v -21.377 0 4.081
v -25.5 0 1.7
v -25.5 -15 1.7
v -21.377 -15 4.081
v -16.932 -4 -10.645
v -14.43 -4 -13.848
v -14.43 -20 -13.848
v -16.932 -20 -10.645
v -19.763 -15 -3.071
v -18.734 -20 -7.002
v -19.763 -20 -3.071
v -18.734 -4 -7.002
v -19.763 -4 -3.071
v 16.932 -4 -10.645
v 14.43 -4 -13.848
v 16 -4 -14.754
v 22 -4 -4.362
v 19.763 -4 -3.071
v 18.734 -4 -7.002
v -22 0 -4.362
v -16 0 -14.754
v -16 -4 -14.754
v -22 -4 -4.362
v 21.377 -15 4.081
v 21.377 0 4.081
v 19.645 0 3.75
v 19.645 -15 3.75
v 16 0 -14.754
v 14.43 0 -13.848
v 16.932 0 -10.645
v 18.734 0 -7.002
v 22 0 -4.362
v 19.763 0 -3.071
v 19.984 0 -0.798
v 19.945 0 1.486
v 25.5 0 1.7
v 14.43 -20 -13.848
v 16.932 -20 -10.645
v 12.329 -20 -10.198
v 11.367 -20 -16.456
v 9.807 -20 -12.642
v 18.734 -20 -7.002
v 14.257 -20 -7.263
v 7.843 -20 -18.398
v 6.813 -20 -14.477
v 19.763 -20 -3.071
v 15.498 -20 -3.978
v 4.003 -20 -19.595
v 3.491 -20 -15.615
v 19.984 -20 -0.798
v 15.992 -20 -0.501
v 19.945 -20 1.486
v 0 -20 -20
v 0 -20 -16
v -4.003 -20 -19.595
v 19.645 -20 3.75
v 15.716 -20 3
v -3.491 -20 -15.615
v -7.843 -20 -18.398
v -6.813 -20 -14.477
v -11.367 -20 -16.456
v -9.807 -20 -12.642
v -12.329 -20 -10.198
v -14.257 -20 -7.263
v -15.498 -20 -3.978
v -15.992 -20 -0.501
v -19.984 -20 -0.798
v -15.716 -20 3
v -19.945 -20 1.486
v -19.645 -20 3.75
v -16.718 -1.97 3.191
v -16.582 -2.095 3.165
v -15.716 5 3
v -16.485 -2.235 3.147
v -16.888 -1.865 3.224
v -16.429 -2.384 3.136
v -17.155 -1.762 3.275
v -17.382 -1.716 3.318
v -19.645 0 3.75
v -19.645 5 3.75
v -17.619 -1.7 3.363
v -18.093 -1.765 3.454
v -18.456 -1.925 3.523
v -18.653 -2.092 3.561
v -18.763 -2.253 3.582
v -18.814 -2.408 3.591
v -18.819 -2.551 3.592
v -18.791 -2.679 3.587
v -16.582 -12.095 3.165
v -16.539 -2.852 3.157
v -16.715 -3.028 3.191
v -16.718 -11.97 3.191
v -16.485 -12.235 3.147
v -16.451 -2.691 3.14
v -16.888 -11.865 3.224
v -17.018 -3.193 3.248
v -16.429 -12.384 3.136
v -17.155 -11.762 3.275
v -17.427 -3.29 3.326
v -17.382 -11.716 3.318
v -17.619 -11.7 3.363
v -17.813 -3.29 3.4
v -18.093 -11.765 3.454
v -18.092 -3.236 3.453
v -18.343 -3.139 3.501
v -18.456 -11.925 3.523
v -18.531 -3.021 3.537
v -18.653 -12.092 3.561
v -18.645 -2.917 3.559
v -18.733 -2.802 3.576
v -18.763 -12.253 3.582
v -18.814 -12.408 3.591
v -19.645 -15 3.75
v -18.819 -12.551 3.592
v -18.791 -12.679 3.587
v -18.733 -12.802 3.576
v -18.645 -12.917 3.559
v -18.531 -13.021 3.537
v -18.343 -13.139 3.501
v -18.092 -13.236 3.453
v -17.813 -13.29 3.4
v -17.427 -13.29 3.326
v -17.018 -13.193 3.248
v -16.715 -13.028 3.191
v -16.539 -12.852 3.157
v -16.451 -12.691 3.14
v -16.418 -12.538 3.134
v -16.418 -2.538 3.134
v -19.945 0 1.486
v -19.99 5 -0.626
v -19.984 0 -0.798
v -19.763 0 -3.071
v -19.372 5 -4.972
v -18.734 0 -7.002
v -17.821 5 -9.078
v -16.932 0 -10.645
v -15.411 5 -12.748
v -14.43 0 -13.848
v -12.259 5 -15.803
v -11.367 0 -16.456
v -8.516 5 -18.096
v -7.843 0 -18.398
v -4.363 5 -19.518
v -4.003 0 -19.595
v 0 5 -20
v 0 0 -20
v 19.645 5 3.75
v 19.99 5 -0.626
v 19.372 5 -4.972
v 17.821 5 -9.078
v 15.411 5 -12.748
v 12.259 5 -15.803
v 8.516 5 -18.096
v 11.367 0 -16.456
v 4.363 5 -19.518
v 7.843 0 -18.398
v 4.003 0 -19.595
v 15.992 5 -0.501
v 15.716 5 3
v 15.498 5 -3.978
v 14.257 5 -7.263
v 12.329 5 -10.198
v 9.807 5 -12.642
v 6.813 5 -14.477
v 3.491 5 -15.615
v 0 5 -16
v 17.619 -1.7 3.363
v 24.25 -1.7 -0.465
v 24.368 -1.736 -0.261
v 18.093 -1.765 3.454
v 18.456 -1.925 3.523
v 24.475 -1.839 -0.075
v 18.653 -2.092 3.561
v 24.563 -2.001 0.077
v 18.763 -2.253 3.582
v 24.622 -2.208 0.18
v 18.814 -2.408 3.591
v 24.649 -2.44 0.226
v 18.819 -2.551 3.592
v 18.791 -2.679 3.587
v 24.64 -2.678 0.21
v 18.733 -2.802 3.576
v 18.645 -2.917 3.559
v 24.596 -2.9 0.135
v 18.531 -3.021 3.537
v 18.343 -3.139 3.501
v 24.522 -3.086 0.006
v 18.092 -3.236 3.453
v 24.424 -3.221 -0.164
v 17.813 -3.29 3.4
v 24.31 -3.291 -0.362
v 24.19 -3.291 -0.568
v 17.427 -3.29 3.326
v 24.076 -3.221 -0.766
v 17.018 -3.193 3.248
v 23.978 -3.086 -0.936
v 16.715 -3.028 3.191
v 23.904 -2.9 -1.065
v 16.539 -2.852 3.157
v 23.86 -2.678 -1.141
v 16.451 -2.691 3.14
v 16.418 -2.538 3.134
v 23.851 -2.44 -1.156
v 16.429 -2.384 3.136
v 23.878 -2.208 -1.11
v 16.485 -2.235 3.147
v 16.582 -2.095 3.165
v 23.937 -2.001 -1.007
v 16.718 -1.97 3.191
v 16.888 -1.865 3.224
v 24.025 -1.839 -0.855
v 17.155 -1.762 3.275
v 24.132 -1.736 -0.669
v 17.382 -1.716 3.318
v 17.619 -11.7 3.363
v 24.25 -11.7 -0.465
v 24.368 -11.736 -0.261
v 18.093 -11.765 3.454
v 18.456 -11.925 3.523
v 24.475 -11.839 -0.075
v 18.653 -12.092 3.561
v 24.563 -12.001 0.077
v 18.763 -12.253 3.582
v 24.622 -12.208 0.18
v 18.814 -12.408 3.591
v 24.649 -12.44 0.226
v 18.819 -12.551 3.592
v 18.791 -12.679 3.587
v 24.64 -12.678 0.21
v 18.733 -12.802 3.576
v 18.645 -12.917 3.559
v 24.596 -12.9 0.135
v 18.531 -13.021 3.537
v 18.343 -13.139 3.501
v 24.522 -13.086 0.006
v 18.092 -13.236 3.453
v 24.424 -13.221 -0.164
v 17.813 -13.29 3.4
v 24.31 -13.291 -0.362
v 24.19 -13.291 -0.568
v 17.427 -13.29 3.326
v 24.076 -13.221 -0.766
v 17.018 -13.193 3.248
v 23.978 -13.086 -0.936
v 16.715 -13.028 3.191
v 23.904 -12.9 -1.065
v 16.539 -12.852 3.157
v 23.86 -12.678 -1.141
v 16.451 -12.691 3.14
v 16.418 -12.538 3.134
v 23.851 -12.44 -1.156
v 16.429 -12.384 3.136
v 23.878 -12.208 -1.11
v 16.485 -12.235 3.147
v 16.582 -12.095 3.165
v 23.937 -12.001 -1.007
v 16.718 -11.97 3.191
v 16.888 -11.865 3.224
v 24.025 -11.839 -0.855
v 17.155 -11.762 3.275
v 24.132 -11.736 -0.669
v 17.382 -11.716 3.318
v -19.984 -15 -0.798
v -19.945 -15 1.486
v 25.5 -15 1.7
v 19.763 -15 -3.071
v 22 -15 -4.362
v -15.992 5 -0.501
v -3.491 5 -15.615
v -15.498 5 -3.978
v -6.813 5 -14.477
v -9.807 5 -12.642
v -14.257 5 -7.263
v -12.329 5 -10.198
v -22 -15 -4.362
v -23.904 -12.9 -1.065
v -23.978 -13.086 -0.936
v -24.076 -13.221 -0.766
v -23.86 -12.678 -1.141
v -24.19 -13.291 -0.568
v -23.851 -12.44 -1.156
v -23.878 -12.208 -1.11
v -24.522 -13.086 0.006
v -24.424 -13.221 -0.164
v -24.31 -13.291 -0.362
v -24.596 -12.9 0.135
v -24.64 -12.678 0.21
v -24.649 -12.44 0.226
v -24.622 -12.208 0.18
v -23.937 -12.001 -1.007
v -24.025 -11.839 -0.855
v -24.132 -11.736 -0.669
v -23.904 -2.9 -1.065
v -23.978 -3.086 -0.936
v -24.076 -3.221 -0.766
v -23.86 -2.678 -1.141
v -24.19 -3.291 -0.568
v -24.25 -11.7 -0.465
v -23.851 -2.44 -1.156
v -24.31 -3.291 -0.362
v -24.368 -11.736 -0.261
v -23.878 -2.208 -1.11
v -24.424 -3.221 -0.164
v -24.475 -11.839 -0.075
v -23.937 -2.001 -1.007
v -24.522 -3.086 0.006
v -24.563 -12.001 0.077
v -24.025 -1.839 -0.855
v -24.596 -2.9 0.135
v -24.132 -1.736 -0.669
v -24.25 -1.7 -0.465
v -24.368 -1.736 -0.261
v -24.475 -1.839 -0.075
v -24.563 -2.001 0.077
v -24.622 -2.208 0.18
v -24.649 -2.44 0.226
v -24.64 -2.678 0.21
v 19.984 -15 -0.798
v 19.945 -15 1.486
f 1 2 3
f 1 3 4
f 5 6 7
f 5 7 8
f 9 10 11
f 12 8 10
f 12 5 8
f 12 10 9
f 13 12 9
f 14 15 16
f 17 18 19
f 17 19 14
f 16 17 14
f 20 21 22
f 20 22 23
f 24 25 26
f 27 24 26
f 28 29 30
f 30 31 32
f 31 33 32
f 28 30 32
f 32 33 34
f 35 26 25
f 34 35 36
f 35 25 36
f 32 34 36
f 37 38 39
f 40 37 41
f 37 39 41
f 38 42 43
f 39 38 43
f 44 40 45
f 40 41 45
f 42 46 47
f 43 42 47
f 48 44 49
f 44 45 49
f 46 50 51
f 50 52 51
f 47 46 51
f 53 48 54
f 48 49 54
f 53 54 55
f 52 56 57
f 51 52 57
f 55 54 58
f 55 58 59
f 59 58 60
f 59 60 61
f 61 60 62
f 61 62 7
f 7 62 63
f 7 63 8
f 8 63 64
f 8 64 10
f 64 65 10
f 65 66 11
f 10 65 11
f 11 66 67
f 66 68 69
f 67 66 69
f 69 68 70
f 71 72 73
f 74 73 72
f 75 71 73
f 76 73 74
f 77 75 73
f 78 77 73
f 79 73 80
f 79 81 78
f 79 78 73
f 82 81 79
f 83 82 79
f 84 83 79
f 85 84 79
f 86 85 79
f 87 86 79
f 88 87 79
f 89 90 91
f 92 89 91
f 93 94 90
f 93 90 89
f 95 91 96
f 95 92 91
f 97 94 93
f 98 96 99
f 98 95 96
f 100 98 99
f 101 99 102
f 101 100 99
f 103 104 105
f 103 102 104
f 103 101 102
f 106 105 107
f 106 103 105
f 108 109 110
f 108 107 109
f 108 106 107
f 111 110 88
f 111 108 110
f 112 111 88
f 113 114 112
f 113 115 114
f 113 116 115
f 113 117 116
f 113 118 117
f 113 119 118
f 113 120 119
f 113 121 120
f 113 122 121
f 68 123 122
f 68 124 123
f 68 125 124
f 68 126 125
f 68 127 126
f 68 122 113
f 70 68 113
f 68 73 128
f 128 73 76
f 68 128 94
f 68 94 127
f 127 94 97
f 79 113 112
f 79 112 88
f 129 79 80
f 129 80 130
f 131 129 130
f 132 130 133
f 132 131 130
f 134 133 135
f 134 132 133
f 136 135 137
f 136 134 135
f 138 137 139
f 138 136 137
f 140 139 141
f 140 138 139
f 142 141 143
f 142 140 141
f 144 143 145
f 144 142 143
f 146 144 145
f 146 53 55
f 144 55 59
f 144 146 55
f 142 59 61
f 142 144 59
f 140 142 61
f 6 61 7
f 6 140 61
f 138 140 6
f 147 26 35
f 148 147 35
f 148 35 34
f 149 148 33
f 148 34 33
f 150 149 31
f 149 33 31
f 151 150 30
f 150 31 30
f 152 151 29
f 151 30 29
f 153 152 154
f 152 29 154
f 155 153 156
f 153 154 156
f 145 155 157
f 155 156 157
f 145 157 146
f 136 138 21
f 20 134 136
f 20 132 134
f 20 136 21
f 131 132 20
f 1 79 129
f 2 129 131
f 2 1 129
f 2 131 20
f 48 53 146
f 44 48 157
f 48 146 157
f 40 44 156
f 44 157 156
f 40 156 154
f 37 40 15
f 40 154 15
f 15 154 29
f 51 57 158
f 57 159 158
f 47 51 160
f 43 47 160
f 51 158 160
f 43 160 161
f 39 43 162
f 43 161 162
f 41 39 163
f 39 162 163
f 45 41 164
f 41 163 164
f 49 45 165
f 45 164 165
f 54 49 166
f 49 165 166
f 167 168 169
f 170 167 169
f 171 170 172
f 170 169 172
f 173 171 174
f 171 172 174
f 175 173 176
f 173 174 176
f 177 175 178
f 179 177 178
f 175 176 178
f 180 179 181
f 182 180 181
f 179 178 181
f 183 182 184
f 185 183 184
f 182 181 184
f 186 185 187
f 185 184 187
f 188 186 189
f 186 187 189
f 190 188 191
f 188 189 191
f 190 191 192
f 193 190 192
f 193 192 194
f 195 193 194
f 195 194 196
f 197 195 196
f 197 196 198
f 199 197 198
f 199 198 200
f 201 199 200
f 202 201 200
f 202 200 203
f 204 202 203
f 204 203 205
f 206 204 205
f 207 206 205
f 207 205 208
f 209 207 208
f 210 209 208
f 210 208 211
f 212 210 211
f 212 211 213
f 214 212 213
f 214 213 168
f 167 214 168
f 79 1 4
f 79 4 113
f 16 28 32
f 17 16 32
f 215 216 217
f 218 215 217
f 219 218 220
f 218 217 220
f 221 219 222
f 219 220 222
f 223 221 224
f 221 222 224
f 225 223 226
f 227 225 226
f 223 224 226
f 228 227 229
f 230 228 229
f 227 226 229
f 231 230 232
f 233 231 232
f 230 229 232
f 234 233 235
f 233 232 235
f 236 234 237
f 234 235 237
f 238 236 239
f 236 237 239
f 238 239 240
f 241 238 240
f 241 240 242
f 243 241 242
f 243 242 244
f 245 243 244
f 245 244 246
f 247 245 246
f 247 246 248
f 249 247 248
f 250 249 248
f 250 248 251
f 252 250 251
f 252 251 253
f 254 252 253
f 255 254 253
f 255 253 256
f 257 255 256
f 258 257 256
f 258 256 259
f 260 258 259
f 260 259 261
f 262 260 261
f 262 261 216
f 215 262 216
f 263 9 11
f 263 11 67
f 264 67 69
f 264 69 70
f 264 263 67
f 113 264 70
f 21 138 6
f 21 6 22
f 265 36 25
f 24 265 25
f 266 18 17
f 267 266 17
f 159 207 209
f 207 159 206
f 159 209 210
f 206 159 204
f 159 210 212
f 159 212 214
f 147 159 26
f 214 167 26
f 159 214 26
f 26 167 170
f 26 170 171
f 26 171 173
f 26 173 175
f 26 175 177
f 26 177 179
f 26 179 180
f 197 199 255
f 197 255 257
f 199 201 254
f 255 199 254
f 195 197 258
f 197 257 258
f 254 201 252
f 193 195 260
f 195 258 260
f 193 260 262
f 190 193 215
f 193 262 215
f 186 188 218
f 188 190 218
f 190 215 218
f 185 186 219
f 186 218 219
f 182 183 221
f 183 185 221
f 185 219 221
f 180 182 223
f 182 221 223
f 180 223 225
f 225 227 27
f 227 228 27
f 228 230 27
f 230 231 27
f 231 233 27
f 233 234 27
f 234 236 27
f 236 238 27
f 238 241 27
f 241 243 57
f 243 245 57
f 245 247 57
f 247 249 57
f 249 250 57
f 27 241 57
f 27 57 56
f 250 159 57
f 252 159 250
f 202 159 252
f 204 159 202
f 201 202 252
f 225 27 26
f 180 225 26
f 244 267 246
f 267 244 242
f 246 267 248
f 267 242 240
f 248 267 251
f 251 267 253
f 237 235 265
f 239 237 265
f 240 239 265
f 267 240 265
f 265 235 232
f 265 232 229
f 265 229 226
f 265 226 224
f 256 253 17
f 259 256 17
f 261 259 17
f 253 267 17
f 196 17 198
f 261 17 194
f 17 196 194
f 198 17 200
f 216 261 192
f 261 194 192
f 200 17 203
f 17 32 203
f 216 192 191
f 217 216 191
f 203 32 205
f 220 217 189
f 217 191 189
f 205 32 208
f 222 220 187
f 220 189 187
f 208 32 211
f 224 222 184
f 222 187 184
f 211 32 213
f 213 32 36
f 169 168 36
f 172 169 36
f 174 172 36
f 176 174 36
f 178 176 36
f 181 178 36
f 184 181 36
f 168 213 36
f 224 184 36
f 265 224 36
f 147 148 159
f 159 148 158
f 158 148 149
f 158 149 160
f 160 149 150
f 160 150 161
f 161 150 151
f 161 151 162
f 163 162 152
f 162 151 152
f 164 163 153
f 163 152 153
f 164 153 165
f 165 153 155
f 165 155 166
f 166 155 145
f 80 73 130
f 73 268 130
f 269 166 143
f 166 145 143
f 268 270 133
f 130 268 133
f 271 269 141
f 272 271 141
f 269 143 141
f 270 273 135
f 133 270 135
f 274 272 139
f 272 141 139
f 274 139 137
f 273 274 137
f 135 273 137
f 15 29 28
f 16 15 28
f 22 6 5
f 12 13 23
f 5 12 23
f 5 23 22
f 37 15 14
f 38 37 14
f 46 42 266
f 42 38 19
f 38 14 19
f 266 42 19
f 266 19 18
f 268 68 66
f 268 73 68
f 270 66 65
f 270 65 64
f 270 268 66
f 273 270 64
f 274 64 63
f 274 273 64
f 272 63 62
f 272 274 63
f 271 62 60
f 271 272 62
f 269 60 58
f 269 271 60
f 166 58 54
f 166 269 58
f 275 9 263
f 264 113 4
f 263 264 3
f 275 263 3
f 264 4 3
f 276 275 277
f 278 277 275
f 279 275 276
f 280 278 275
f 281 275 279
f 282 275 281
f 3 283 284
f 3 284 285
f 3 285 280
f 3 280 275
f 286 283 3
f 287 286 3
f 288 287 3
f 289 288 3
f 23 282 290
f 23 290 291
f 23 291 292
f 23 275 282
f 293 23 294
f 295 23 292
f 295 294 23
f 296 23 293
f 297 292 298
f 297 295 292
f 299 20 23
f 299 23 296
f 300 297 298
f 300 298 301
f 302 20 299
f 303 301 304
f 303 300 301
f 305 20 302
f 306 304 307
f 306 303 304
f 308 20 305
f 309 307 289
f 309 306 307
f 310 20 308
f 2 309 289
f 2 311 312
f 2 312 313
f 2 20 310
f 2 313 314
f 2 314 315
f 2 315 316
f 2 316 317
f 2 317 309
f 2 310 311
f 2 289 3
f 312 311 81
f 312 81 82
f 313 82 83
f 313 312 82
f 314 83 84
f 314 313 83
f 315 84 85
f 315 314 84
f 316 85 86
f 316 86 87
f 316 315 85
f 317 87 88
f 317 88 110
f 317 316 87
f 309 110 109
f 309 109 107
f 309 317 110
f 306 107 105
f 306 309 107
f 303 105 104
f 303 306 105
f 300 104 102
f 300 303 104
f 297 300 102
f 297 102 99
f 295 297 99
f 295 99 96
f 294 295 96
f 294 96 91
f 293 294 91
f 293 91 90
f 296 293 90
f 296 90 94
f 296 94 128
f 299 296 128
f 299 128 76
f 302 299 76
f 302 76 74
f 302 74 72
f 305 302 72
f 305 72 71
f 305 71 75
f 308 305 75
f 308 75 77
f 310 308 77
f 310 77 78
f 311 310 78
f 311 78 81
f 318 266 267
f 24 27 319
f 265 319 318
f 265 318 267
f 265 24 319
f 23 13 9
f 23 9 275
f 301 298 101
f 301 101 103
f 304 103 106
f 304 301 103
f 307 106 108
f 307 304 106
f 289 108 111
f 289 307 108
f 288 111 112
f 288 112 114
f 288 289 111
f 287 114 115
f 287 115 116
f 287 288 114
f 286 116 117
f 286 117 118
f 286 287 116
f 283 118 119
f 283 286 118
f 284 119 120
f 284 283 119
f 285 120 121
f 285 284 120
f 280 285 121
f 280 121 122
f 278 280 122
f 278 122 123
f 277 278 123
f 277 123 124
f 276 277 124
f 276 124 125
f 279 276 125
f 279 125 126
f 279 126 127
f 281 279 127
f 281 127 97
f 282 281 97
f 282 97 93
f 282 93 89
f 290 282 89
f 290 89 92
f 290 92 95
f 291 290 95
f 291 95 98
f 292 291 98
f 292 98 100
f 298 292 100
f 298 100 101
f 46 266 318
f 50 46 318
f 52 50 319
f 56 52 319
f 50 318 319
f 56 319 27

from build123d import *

# Parameters (mm, degrees)
F1_DEPTH = 20
F2_DEPTH = 5
F3_DEPTH = 4
F4_DEPTH = 15
F5_R     = 0.8
F6_DEPTH = 8.5841977808


# Not quite as in the source:
# - a feature names something its author has since deleted; it is built from what else it names


with BuildPart() as f1:
    # F0 (on Front) → F1 (new body)
    with BuildSketch(Plane.XZ):
        with BuildLine():
            ThreePointArc((15.7162336455, 3), (12.3288280059, -10.1980390272), (0, -16))
            Line((0, -16), (0, -20))
            ThreePointArc((0, -20), (7.8433854689, -18.397861408), (14.4301518825, -13.8481304387))
            ThreePointArc((14.4301518825, -13.8481304387), (17.9256749339, -8.8696210836), (19.762883185, -3.0705778311))
            ThreePointArc((19.762883185, -3.0705778311), (19.9970282657, 0.3447615687), (19.6452920569, 3.75))
            Line((19.6452920569, 3.75), (15.7162336455, 3))
        make_face()
    extrude(amount=F1_DEPTH)

    # F1_face (on face) → F2 (join)
    with BuildSketch(Plane(origin=(12.1989359317, 0, -10.0905961752), x_dir=(1, 0, 0), z_dir=(0, 1, 0))):
        with BuildLine():
            Line((3.5172977138, -13.0905961752), (7.4463561252, -13.8405961752))
            ThreePointArc((7.4463561252, -13.8405961752), (3.2120990757, 2.6569526088), (-12.1989359317, 9.9094038248))
            Line((-12.1989359317, 9.9094038248), (-12.1989359317, 5.9094038248))
            ThreePointArc((-12.1989359317, 5.9094038248), (0.1298920742, 0.107442852), (3.5172977138, -13.0905961752))
        make_face()
    extrude(amount=F2_DEPTH)

    # F0 (on Front) → F3 (join)
    with BuildSketch(Plane.XZ):
        with BuildLine():
            ThreePointArc((15.7162336455, 3), (12.3288280059, -10.1980390272), (0, -16))
            Line((0, -16), (0, -20))
            ThreePointArc((0, -20), (7.8433854689, -18.397861408), (14.4301518825, -13.8481304387))
            ThreePointArc((14.4301518825, -13.8481304387), (17.9256749339, -8.8696210836), (19.762883185, -3.0705778311))
            ThreePointArc((19.762883185, -3.0705778311), (19.9970282657, 0.3447615687), (19.6452920569, 3.75))
            Line((19.6452920569, 3.75), (15.7162336455, 3))
        make_face()
        with BuildLine():
            Line((21.3768143102, 4.080522368), (19.6452920569, 3.75))
            ThreePointArc((19.6452920569, 3.75), (19.9970282657, 0.3447615687), (19.762883185, -3.0705778311))
            Line((19.762883185, -3.0705778311), (22, -4.3621778265))
            Line((22, -4.3621778265), (25.5, 1.7))
            Line((25.5, 1.7), (21.3768143102, 4.080522368))
        make_face()
        with BuildLine():
            ThreePointArc((19.762883185, -3.0705778311), (17.9256749339, -8.8696210836), (14.4301518825, -13.8481304387))
            Line((14.4301518825, -13.8481304387), (16, -14.7544826719))
            Line((16, -14.7544826719), (22, -4.3621778265))
            Line((22, -4.3621778265), (19.762883185, -3.0705778311))
        make_face()
    extrude(amount=F3_DEPTH)

    # F0 (on Front) → F4 (join)
    with BuildSketch(Plane.XZ):
        with BuildLine():
            Line((21.3768143102, 4.080522368), (19.6452920569, 3.75))
            ThreePointArc((19.6452920569, 3.75), (19.9970282657, 0.3447615687), (19.762883185, -3.0705778311))
            Line((19.762883185, -3.0705778311), (22, -4.3621778265))
            Line((22, -4.3621778265), (25.5, 1.7))
            Line((25.5, 1.7), (21.3768143102, 4.080522368))
        make_face()
    extrude(amount=F4_DEPTH)

    # F5 (on face) → F6 (cut, through all)
    with BuildSketch(Plane(origin=(18.3888784068, 0, -10.6168238983), x_dir=(0, 1, 0), z_dir=(0.8660254038, 0, -0.5))):
        with Locations((-12.5, 11.7222431864)):
            Circle(F5_R)
        with Locations((-2.5, 11.7222431864)):
            Circle(F5_R)
    extrude(amount=-F6_DEPTH, mode=Mode.SUBTRACT)

    # F7: F1 across plane


with BuildPart() as f1_1:
    add(f1.part)
    add(f1.part.mirror(Plane.YZ))


solid = f1_1.part
